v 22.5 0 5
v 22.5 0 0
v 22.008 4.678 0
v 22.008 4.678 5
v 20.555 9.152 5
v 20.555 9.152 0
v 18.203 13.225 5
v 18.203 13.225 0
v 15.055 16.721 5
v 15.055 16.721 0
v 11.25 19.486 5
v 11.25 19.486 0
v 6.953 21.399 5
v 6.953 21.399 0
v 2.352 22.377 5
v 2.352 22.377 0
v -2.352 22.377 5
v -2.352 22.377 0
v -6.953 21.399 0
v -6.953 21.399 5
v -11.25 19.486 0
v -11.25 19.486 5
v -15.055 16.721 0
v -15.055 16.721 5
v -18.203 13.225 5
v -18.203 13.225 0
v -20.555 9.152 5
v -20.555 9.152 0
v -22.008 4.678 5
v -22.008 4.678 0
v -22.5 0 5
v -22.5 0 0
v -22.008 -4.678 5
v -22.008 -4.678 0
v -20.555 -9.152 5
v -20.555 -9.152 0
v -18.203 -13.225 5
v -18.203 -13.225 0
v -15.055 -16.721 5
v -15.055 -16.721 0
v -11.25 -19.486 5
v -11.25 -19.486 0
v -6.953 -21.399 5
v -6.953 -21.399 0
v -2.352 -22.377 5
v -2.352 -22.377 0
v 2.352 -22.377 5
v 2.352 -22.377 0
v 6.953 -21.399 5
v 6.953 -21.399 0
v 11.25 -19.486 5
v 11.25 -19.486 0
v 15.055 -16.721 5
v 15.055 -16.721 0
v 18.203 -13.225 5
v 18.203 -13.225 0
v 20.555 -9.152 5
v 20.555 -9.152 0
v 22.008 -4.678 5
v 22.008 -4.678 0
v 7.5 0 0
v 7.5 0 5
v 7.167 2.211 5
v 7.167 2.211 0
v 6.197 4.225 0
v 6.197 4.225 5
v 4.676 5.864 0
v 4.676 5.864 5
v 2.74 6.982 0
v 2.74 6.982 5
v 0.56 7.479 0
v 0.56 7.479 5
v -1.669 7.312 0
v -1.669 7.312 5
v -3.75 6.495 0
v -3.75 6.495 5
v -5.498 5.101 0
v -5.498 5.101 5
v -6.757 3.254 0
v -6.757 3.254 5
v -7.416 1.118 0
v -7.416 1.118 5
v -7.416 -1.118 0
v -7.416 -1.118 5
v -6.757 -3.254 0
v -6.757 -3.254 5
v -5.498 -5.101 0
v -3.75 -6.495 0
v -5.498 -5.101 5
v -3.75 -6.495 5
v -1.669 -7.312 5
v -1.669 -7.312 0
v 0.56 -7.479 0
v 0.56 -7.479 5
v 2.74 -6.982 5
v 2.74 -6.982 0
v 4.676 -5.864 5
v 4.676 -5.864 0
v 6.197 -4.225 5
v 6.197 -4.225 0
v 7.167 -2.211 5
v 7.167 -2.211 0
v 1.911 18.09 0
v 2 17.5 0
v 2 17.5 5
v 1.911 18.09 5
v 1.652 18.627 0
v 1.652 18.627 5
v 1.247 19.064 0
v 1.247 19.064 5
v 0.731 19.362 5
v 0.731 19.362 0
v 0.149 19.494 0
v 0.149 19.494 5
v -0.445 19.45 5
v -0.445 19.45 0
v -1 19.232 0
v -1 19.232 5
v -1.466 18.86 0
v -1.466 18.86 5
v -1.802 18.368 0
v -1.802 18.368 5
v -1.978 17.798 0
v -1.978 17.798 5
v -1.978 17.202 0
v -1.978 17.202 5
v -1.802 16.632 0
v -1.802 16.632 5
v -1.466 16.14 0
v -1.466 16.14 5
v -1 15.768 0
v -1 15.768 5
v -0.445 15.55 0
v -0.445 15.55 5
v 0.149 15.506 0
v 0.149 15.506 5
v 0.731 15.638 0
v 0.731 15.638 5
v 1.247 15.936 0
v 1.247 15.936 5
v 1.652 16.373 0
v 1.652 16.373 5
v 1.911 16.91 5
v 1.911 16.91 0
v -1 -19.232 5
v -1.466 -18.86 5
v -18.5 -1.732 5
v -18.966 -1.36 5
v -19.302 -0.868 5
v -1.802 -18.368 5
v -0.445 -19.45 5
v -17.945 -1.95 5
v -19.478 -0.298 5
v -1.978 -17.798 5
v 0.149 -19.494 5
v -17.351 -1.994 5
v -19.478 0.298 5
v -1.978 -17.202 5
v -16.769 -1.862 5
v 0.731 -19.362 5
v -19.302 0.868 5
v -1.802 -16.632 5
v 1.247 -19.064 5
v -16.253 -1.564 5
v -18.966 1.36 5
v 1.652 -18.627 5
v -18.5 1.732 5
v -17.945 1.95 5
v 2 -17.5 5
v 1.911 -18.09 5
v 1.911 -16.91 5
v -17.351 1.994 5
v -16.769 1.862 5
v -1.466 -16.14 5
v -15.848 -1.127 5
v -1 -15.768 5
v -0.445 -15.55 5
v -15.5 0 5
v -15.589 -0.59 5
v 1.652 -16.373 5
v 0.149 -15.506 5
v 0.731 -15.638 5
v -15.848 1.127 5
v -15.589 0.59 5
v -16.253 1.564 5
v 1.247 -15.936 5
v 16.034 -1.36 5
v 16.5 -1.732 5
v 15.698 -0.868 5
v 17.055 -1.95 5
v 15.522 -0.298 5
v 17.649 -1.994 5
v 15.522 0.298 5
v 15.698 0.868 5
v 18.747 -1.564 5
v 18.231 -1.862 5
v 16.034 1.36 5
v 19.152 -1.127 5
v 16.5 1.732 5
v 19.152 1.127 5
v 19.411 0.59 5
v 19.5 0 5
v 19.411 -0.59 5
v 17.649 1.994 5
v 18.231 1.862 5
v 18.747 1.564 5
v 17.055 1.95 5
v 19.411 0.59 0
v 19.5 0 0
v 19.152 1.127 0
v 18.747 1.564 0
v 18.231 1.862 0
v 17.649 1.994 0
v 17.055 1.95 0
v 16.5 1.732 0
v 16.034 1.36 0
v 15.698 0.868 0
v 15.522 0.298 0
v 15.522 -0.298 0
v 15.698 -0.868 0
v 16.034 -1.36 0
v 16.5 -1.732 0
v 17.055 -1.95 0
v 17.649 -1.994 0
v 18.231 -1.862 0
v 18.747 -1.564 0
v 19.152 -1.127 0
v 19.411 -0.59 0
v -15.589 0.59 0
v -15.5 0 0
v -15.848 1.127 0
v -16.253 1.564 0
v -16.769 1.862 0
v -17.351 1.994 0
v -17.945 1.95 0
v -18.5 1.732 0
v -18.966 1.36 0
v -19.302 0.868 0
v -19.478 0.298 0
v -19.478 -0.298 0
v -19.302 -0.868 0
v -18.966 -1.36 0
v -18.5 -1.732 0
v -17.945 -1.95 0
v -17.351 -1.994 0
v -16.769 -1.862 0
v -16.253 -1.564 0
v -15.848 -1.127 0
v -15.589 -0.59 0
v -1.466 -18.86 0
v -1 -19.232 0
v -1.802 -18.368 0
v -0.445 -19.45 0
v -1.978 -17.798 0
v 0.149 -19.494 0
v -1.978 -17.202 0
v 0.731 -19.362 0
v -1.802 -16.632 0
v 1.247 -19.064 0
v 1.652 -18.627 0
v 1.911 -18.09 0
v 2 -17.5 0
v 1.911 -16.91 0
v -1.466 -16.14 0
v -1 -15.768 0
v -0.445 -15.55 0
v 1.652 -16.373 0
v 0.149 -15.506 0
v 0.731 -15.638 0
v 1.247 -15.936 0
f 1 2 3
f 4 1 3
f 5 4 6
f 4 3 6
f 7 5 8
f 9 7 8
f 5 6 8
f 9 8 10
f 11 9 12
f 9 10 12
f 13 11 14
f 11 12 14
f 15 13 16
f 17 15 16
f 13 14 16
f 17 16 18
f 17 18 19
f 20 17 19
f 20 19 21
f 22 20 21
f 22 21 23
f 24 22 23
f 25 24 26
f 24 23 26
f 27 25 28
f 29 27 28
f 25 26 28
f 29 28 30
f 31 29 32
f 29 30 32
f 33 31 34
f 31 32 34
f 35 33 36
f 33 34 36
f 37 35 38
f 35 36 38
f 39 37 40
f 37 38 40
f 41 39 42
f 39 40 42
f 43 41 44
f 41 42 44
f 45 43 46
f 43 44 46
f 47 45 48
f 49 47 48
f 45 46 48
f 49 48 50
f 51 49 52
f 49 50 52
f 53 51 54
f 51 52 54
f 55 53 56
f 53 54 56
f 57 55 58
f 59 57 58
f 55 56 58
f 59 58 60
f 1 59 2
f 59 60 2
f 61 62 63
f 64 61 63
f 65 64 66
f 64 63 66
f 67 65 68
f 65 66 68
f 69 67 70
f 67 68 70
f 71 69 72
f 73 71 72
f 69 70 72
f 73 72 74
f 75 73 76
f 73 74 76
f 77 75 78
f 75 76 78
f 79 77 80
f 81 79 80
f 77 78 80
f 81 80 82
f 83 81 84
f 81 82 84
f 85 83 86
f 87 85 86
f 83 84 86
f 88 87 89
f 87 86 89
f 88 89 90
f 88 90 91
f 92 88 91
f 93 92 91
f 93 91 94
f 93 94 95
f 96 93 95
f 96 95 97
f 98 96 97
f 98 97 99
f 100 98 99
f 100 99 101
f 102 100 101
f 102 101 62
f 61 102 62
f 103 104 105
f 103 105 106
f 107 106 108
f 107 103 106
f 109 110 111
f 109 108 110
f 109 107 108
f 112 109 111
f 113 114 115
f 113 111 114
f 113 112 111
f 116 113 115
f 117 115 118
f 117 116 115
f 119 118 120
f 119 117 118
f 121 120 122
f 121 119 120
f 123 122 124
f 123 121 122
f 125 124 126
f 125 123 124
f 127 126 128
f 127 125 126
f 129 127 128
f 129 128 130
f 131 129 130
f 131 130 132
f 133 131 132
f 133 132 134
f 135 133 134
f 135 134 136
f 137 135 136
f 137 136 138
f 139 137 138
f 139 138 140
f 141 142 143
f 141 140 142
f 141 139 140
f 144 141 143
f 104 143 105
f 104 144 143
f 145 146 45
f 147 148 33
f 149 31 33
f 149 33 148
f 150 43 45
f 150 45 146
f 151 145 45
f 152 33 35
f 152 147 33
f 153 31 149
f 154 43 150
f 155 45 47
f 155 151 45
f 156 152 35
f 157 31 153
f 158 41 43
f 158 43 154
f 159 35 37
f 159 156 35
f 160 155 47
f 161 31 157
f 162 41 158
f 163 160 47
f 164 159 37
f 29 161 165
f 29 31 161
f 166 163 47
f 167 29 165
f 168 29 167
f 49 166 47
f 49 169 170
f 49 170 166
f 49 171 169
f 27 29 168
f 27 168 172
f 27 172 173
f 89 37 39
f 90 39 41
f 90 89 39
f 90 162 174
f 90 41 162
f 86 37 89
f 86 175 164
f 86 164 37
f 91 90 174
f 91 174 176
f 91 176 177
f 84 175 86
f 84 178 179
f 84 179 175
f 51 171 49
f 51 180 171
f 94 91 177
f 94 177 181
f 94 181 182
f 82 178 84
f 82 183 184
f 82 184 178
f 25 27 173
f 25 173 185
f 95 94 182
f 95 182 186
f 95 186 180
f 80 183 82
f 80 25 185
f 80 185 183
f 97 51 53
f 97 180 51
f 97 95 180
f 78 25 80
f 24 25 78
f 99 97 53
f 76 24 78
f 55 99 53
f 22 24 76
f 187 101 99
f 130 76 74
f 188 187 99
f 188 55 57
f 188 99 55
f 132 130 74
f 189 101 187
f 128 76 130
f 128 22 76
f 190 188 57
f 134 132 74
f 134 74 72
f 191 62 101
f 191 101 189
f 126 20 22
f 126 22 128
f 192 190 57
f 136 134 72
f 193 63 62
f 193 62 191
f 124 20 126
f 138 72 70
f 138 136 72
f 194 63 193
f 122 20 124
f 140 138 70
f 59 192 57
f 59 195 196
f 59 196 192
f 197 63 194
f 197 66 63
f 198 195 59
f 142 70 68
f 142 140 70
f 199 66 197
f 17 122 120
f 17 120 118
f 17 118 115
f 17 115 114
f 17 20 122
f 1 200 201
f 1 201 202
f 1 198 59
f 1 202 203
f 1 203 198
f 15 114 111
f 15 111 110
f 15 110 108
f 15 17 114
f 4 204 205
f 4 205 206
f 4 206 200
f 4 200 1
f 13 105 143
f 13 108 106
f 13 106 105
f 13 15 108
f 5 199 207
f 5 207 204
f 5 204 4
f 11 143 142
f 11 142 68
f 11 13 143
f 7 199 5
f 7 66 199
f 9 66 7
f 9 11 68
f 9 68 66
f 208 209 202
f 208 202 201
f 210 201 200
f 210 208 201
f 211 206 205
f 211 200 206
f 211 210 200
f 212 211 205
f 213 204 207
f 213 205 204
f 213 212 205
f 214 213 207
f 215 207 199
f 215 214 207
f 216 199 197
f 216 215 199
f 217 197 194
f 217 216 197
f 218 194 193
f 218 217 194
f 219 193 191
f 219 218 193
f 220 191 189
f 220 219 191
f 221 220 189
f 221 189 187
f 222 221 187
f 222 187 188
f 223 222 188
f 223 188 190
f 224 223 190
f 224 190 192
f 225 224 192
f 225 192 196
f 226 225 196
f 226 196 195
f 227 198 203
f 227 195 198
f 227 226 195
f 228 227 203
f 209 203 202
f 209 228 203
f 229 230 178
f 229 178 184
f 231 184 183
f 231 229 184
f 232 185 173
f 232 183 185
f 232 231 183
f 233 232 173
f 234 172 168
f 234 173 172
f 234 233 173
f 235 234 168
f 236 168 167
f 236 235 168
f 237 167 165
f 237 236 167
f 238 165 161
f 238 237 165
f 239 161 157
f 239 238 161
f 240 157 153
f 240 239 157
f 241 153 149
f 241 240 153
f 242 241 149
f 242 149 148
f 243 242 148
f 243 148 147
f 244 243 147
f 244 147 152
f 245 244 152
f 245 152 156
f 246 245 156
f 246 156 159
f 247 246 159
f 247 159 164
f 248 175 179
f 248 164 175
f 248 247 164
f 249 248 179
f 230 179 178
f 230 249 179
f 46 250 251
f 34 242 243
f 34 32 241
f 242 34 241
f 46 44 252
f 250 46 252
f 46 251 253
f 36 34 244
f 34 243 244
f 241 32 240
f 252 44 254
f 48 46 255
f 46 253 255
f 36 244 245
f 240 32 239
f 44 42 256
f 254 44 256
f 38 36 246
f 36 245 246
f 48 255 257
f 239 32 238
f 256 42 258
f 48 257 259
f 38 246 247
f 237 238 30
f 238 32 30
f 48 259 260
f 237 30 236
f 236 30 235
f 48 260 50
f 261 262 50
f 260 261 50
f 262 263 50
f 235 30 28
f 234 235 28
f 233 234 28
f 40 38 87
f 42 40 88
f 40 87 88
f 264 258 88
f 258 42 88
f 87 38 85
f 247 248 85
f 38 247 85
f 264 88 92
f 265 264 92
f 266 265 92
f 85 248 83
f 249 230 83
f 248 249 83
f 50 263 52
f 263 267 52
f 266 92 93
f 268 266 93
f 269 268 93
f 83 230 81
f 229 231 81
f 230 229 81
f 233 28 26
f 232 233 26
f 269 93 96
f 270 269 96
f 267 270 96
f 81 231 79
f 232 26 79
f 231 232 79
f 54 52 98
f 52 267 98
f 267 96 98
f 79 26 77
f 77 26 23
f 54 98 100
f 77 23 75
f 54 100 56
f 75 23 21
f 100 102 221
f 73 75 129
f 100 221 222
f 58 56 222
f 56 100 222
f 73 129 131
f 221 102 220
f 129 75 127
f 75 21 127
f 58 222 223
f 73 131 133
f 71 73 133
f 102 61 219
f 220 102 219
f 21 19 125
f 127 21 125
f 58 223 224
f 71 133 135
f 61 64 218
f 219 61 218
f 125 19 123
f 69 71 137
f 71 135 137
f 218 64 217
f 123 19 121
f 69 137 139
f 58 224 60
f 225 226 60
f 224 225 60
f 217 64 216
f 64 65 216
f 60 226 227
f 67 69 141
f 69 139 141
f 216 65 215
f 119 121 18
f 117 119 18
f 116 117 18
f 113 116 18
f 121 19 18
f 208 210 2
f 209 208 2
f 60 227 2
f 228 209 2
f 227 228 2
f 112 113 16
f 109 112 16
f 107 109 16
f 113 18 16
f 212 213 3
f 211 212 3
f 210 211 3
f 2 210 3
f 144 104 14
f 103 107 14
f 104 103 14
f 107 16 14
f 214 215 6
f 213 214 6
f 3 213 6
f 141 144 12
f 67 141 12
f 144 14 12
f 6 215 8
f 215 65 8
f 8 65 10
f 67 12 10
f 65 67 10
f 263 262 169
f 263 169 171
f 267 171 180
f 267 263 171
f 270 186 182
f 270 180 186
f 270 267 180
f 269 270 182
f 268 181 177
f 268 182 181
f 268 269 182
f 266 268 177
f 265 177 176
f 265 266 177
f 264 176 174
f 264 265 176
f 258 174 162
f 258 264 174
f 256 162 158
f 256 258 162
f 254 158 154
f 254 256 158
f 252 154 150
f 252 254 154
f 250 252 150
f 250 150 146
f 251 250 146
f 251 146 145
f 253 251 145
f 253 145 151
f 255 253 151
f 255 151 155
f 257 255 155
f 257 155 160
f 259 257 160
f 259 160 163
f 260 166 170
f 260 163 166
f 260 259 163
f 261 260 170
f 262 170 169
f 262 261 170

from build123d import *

# Parameters (mm, degrees)
SKETCH_1_R               = 22.5
EXTRUDE_1_DEPTH          = 5
SKETCH_2_R               = 7.5
CUT_EXTRUDE_1_DEPTH      = 33.210246817
CUT_EXTRUDE_2_DEPTH      = 33.210246817
CUT_EXTRUDE_2_DEPTH_BACK = 33.210246817
SKETCH_3_R               = 2


with BuildPart() as part:
    # 草图1 → 凸台-拉伸1 (new body)
    with BuildSketch(Plane.XY):
        Circle(SKETCH_1_R)
    extrude(amount=EXTRUDE_1_DEPTH)

    # 草图2 → 切除-拉伸1 (cut, through all)
    with BuildSketch(Plane.XY.offset(5)):
        Circle(SKETCH_2_R)
    extrude(amount=-CUT_EXTRUDE_1_DEPTH, mode=Mode.SUBTRACT)

    # 草图3 → 切除-拉伸2 (cut, two sides: drawn at the far end of the back side and taken through both)
    with BuildSketch(Plane.XY.offset(5).offset(-CUT_EXTRUDE_2_DEPTH_BACK)):
        with Locations((-17.5, 0)):
            Circle(SKETCH_3_R)
        with Locations((0, -17.5)):
            Circle(SKETCH_3_R)
        with Locations((17.5, 0)):
            Circle(SKETCH_3_R)
        with Locations((0, 17.5)):
            Circle(SKETCH_3_R)
    extrude(amount=CUT_EXTRUDE_2_DEPTH + CUT_EXTRUDE_2_DEPTH_BACK, mode=Mode.SUBTRACT)


solid = part.part
